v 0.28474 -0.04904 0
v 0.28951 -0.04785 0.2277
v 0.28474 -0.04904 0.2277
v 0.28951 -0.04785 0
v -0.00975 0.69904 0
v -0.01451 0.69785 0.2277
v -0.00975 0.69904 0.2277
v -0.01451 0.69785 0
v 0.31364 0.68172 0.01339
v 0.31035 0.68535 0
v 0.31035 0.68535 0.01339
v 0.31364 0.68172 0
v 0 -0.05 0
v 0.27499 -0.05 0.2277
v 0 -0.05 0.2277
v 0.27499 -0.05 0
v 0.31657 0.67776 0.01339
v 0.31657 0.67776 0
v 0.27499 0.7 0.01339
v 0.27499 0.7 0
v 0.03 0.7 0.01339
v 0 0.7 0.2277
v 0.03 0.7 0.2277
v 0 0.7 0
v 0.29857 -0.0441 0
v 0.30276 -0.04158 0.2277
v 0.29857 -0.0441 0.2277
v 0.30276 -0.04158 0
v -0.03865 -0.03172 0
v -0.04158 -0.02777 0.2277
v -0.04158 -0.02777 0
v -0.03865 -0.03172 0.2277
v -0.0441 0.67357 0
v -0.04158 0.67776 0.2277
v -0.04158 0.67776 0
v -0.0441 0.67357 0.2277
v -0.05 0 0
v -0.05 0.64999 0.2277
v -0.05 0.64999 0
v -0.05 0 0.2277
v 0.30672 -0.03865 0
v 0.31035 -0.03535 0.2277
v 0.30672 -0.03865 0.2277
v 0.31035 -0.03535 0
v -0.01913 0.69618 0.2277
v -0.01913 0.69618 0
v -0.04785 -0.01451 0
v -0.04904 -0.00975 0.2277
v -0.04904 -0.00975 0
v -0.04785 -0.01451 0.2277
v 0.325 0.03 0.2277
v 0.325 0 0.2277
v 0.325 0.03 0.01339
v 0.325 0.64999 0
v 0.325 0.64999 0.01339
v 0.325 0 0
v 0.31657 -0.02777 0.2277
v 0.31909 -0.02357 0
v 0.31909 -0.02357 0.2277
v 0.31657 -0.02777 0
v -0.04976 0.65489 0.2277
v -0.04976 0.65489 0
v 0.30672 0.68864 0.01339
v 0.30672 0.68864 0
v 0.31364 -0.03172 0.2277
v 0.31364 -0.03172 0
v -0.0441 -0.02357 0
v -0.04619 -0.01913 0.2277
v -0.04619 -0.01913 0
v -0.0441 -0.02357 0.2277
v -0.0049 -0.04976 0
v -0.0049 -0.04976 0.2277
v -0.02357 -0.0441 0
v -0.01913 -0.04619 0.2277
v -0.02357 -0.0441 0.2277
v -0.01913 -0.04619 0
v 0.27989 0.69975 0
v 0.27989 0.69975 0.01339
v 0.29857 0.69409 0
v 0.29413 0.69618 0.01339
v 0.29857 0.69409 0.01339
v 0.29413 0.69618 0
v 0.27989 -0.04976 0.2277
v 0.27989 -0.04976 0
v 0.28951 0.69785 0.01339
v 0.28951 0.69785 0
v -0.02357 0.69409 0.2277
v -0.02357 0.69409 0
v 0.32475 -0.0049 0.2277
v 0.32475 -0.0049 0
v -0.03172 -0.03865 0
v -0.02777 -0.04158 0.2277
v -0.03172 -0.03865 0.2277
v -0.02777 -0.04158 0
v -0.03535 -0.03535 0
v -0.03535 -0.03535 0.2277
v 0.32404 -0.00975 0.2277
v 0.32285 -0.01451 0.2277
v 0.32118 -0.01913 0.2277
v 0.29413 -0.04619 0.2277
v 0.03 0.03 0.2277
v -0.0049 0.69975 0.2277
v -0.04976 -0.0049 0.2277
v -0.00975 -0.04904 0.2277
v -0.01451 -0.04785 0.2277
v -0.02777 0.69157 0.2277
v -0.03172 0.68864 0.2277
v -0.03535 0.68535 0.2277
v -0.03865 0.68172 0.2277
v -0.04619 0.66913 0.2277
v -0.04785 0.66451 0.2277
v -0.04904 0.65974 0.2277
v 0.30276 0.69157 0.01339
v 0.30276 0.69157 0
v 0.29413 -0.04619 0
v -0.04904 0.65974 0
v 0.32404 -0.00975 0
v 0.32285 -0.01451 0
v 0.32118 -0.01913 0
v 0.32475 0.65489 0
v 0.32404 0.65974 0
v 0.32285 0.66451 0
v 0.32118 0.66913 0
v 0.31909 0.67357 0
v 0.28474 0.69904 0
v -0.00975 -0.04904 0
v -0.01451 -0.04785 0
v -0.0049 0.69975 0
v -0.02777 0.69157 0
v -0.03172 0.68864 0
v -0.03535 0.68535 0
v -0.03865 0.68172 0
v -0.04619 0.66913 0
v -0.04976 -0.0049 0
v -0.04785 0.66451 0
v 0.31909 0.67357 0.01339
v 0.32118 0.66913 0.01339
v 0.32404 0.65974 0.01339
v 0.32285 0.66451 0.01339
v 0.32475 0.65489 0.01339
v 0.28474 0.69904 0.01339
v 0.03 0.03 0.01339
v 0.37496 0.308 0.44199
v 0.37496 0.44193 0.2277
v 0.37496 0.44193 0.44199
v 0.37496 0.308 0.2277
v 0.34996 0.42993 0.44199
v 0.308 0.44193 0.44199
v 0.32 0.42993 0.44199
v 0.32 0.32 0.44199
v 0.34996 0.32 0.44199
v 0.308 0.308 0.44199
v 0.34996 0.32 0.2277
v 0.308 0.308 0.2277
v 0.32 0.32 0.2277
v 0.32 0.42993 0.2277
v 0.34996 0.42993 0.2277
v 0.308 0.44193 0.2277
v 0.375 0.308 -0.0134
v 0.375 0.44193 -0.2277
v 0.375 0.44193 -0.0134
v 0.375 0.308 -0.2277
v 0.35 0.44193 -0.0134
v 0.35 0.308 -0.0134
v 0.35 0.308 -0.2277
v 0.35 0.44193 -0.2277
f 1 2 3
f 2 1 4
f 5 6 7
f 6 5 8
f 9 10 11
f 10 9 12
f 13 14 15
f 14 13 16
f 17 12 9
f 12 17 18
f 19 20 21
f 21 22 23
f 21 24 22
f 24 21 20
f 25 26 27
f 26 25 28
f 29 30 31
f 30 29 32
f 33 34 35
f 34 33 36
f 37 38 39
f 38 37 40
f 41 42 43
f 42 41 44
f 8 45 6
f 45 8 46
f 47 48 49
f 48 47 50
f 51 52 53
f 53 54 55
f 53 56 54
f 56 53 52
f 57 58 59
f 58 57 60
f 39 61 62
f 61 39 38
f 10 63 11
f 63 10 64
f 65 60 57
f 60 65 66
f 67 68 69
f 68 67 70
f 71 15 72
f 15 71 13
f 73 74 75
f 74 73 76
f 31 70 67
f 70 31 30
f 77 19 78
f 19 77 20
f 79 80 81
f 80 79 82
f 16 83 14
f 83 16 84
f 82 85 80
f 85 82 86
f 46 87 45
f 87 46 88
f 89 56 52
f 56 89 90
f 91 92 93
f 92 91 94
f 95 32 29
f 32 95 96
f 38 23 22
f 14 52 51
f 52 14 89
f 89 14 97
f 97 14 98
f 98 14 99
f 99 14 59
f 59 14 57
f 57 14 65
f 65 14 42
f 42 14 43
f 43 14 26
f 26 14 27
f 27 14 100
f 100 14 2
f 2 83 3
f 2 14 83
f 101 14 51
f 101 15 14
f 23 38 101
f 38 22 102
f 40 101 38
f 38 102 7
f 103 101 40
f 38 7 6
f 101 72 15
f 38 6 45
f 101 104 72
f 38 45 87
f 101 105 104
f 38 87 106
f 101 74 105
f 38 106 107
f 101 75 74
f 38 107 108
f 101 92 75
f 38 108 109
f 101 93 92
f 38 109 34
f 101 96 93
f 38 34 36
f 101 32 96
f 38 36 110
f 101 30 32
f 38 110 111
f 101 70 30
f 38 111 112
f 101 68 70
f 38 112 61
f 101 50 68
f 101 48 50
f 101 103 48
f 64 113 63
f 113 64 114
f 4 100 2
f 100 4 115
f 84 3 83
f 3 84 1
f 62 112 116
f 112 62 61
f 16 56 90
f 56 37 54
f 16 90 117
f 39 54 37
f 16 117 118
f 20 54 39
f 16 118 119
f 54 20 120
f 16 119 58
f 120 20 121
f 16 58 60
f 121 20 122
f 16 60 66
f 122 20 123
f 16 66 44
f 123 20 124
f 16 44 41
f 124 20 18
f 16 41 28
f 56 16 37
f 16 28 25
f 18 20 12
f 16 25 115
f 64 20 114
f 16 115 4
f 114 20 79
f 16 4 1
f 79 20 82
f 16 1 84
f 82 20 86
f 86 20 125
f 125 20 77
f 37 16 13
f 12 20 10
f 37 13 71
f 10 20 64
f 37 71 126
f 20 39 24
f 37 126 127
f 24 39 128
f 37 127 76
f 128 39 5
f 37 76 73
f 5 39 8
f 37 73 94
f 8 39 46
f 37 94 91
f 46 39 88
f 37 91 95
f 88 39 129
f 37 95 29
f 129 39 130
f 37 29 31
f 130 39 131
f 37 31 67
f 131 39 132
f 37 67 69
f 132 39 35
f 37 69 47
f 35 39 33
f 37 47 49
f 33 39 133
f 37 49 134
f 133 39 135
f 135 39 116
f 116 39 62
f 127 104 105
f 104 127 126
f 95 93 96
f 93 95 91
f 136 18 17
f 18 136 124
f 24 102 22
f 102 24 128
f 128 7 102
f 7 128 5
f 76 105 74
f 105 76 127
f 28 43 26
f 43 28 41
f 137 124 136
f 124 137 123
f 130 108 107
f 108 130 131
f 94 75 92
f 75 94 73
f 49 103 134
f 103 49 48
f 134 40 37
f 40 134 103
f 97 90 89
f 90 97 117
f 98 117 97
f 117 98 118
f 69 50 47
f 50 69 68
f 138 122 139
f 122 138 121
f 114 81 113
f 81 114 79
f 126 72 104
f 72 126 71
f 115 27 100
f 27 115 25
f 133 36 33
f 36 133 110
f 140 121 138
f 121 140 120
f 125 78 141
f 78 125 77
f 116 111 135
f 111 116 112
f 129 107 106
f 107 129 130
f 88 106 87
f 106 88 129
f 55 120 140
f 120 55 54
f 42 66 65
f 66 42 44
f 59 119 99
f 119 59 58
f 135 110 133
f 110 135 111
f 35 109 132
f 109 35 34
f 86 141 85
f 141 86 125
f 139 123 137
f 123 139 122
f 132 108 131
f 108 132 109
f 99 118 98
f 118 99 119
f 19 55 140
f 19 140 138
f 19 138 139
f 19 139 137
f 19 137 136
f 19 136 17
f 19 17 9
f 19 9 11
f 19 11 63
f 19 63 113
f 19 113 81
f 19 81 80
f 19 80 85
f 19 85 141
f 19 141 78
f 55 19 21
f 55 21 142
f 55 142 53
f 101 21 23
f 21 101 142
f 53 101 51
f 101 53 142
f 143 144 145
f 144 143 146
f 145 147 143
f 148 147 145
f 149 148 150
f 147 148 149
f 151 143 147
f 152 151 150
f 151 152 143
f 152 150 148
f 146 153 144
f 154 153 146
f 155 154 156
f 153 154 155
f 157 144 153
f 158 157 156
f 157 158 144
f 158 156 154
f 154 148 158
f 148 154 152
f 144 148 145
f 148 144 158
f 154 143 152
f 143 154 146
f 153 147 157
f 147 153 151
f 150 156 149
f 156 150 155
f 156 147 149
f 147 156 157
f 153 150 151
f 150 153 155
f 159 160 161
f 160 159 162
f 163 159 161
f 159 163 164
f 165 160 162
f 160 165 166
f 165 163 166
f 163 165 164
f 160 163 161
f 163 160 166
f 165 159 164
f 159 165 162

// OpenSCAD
// Parameters
base_length = 0.375;
base_width = 0.75;
base_height = 0.013393;

second_solid_reach = 0.2277;          // top Z of second solid
corner_radius = 0.05;                 // outer footprint rounding
frame_wall = 0.03;                    // wall thickness of second solid frame

sleeve_x_offset_left = 0.308;        // left edge of raised sleeve
sleeve_y_offset_front = 0.308;       // front edge of raised sleeve
sleeve_y_offset_back = 0.3081;       // back edge offset
sleeve_length = 0.066964;            // X size of sleeve
sleeve_width = 0.133929;             // Y size of sleeve
sleeve_height = 0.214286;            // sleeve extrusion height
sleeve_total_reach = 0.442;          // top Z of sleeve

right_wall_thickness = 0.025;        // thicker right wall for lower continuation
sleeve_wall = 0.012;                 // uniform wall thickness elsewhere

lower_bottom_reach = -0.2277;        // lower continuation bottom Z
lower_top_reach = -0.0134;           // lower continuation top Z

hole_radius = 0.0067;
hole_x_axis = 0.3616;
hole1_y_axis = 0.6828;
hole2_y_axis = 0.0672;
hole_z_bottom = 0.1674;
hole_z_top = 0.1808;

$fn = 64;

// ----- Base Plate -----
// Outer rounded rectangle footprint
module outer_footprint_2d() {
    offset(r=corner_radius)
        square([base_length - 2*corner_radius, base_width - 2*corner_radius]);
}

// Base solid (no openings)
module base_plate() {
    linear_extrude(height=base_height)
        outer_footprint_2d();
}

// ----- Second Solid (frame on top of base) -----
module inner_cutout_2d() {
    // simple rectangular cutout inside the outer footprint
    translate([frame_wall, frame_wall])
        square([base_length - 2*frame_wall, base_width - 2*frame_wall]);
}

module second_solid_frame() {
    difference() {
        // Full outer body up to second_solid_reach
        linear_extrude(height=second_solid_reach)
            outer_footprint_2d();
        // Cutout only above base_height
        translate([0, 0, base_height])
            linear_extrude(height=second_solid_reach - base_height)
                inner_cutout_2d();
    }
}

// ----- Raised Sleeve (upper hollow post) -----
// Outer solid block
module sleeve_outer() {
    sleeve_outer_x = sleeve_x_offset_left;
    sleeve_outer_y = sleeve_y_offset_front;
    sleeve_outer_dx = sleeve_length;
    sleeve_outer_dy = sleeve_width;
    translate([sleeve_outer_x, sleeve_outer_y, second_solid_reach])
        cube([sleeve_outer_dx, sleeve_outer_dy, sleeve_height]);
}

// Slot cutout inside the sleeve
module sleeve_slot() {
    sleeve_slot_x = sleeve_x_offset_left + sleeve_wall;
    sleeve_slot_y = sleeve_y_offset_front + sleeve_wall;
    sleeve_slot_dx = sleeve_length - sleeve_wall - right_wall_thickness;
    sleeve_slot_dy = sleeve_width - 2*sleeve_wall;
    translate([sleeve_slot_x, sleeve_slot_y, second_solid_reach])
        cube([sleeve_slot_dx, sleeve_slot_dy, sleeve_height]);
}

module raised_sleeve() {
    difference() {
        sleeve_outer();
        sleeve_slot();
    }
}

// ----- Lower Continuation (downward projection) -----
module lower_continuation() {
    lower_x_min = base_length - right_wall_thickness;
    lower_x_max = base_length;
    lower_y_min = sleeve_y_offset_front;
    lower_y_max = sleeve_y_offset_front + sleeve_width;
    lower_depth = lower_top_reach - lower_bottom_reach;  // 0.2143
    translate([lower_x_min, lower_y_min, lower_bottom_reach])
        cube([lower_x_max - lower_x_min, lower_y_max - lower_y_min, lower_depth]);
}

// ----- Small Circular Holes -----
module circular_holes() {
    hole_height = hole_z_top - hole_z_bottom;
    hole_z_center = hole_z_bottom + hole_height / 2;
    // Hole 1
    translate([hole_x_axis, hole1_y_axis, hole_z_center])
        cylinder(h=hole_height, r=hole_radius, center=true);
    // Hole 2
    translate([hole_x_axis, hole2_y_axis, hole_z_center])
        cylinder(h=hole_height, r=hole_radius, center=true);
}

// ----- Final Assembly -----
union() {
    base_plate();
    second_solid_frame();
    raised_sleeve();
    lower_continuation();
}

// Subtract the two small holes from the assembly
difference() {
    children();  // This won't work directly; we'll restructure: apply difference after union using separate module.

    // Better: create main body module and then apply holes difference.
}

// Alternative final structure is to union everything then difference the holes.
// In OpenSCAD best practice: put everything in a module that returns the union,
// then call difference with that module and the holes.

module main_body() {
    base_plate();
    second_solid_frame();
    raised_sleeve();
    lower_continuation();
}

module final_model() {
    difference() {
        main_body();
        circular_holes();
    }
}

final_model();
